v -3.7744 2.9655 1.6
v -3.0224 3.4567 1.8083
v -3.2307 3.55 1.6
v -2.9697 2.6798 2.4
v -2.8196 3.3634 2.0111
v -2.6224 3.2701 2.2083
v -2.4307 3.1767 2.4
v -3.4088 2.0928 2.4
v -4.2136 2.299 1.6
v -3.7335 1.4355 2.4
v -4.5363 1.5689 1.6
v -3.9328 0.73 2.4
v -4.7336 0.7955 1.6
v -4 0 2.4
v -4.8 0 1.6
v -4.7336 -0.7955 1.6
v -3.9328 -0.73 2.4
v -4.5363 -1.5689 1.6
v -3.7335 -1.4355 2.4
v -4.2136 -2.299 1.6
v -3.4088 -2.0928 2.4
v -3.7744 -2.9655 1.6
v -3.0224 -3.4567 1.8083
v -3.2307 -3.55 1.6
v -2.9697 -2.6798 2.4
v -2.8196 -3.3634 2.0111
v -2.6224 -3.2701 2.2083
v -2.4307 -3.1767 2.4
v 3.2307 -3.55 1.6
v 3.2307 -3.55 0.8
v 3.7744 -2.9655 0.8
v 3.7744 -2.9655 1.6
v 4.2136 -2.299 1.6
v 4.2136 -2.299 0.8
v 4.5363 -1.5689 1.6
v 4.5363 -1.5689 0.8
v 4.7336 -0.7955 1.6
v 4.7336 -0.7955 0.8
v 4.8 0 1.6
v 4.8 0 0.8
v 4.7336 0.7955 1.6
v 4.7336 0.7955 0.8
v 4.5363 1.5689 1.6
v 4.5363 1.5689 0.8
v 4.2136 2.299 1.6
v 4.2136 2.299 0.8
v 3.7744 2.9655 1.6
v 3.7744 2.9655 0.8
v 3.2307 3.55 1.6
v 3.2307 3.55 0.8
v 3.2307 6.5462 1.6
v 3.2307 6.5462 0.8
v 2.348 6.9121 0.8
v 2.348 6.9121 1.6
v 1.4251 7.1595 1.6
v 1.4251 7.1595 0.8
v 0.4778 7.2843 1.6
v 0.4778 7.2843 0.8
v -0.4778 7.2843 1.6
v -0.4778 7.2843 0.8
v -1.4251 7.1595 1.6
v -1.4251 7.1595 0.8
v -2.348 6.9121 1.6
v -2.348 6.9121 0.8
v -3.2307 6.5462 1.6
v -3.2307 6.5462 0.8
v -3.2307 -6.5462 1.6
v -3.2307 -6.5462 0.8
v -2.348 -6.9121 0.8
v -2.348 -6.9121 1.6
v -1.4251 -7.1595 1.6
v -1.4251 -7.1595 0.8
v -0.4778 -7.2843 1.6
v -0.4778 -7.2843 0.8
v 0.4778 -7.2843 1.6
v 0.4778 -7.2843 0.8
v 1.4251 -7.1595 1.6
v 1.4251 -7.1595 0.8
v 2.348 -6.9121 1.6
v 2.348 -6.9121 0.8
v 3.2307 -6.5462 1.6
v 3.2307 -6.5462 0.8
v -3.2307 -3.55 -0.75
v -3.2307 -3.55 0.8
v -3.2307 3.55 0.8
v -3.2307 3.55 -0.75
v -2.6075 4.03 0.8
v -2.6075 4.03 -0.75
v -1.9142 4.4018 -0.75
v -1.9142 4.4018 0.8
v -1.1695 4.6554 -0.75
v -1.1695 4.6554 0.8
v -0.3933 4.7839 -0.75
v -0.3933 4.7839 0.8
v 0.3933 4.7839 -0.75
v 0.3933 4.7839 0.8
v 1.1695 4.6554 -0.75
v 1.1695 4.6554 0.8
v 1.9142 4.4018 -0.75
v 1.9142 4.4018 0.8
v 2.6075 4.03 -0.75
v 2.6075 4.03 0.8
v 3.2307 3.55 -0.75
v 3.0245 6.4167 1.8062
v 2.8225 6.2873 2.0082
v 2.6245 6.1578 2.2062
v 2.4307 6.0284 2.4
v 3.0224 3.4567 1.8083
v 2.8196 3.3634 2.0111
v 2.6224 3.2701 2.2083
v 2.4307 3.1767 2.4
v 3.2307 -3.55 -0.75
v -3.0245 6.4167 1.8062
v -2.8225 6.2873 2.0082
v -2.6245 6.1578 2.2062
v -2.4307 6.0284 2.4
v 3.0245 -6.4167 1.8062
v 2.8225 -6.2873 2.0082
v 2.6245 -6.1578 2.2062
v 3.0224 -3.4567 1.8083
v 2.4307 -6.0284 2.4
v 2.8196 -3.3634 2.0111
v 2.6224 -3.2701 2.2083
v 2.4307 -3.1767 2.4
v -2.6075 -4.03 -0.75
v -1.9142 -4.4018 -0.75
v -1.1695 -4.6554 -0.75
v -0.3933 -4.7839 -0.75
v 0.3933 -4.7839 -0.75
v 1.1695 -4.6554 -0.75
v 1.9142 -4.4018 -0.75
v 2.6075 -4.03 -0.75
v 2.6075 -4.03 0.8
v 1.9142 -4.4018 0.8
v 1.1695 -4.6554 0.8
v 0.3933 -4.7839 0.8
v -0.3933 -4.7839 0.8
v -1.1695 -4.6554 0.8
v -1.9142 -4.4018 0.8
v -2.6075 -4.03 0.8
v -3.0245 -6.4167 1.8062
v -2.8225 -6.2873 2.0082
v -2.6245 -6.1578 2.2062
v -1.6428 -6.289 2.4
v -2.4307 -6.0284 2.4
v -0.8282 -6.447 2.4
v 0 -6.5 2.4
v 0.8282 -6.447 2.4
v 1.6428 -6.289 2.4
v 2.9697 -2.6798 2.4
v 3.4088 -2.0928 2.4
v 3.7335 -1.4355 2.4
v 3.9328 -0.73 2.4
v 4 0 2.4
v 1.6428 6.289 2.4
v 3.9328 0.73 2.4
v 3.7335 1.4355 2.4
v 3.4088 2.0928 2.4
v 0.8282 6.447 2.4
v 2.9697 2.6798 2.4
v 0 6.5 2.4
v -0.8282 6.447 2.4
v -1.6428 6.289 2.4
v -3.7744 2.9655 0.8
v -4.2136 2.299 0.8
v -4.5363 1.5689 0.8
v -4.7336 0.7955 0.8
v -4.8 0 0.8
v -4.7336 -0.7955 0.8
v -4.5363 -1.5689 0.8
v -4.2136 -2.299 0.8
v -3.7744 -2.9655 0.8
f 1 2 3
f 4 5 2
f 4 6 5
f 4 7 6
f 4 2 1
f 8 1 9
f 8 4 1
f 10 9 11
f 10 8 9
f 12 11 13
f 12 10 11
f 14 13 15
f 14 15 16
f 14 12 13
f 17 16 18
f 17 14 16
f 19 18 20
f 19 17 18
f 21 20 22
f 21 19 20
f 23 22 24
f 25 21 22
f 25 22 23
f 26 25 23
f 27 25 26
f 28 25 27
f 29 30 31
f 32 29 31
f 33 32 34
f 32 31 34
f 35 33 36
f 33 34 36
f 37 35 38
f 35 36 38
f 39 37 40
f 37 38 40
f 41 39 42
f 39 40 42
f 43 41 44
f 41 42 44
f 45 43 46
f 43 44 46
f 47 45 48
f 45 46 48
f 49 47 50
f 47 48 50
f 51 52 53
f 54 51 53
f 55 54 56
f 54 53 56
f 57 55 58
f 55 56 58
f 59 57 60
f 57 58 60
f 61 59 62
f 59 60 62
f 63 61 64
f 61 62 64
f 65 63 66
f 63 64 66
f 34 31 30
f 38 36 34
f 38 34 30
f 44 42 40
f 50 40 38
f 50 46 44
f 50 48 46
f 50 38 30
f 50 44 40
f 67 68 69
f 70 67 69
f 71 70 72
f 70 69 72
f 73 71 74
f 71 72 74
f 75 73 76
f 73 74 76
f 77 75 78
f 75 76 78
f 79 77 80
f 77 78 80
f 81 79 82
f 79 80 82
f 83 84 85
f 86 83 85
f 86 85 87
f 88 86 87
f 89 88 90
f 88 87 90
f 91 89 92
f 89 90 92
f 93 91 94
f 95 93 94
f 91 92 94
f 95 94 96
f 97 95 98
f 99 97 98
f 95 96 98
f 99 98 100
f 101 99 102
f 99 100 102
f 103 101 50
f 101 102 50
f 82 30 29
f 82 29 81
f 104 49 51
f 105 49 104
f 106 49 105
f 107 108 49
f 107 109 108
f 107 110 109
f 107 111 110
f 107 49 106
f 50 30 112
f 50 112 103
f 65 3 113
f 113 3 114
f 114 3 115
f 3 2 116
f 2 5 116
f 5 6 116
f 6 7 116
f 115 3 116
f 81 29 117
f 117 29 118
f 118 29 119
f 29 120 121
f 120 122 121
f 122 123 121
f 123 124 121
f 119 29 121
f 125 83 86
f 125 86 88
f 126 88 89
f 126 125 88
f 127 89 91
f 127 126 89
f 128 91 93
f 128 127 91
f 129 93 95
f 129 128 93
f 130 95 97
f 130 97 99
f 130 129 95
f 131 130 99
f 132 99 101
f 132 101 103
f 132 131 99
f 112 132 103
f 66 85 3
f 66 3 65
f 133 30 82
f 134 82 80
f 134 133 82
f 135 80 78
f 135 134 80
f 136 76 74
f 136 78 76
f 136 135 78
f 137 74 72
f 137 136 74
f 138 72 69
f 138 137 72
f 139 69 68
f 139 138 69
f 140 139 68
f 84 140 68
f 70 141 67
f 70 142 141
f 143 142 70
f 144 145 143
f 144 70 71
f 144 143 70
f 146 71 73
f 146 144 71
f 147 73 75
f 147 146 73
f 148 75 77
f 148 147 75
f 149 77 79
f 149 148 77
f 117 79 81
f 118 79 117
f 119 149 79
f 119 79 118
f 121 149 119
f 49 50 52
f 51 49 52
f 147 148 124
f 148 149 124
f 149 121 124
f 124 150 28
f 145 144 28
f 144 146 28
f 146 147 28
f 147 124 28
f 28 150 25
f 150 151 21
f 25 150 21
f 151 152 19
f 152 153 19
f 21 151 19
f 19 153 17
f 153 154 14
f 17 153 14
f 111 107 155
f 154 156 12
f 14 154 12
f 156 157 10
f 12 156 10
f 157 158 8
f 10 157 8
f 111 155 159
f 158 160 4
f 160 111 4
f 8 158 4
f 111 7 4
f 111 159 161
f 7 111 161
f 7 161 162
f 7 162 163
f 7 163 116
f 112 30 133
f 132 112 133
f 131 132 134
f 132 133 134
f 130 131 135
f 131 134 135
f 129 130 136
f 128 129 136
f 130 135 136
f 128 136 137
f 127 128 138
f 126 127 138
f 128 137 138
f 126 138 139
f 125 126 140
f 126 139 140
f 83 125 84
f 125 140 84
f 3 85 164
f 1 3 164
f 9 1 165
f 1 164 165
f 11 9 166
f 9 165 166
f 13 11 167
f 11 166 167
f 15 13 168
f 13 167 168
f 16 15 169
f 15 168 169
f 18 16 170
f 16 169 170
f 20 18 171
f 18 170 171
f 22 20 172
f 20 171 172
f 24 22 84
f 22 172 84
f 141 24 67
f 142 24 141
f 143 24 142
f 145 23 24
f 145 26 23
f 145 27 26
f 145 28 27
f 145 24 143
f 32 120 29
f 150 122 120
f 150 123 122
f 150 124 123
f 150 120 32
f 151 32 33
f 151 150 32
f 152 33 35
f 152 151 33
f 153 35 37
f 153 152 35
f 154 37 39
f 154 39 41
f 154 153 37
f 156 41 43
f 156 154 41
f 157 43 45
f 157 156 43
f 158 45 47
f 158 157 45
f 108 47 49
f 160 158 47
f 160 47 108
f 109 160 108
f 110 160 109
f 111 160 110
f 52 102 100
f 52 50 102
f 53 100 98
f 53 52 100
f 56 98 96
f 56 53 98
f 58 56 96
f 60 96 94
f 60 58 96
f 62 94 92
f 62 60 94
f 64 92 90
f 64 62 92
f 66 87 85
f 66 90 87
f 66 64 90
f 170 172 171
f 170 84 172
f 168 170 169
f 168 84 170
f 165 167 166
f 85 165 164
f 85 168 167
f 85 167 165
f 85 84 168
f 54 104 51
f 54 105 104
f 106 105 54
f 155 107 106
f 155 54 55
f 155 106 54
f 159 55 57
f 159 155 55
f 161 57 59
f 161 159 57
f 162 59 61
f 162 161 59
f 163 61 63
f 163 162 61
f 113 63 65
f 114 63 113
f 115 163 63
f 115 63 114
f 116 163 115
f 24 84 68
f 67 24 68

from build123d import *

# Parameters (mm, degrees)
PAD007_DEPTH = 1.6
CHAMFER_SIZE = 0.8
PAD008_DEPTH = 1.55


with BuildPart() as part:
    # Sketch011 → Pad007 (new body)
    with BuildSketch(Plane.XY):
        with BuildLine():
            Line((-3.230712, 3.55), (-3.230712, 6.546182))
            ThreePointArc((3.230712, 6.546182), (0, 7.3), (-3.230712, 6.546182))
            Line((3.230712, 3.55), (3.230712, 6.546182))
            ThreePointArc((3.230712, -3.55), (4.8, 0), (3.230712, 3.55))
            Line((3.230712, -3.55), (3.230712, -6.546182))
            ThreePointArc((-3.230712, -6.546182), (0, -7.3), (3.230712, -6.546182))
            Line((-3.230712, -3.55), (-3.230712, -6.546182))
            ThreePointArc((-3.230712, 3.55), (-4.8, 0), (-3.230712, -3.55))
        make_face()
    extrude(amount=PAD007_DEPTH)

    # Chamfer
    chamfer_edges = [part.edges().sort_by_distance(p)[0] for p in [
        (-4.8, 0, 1.6),
        (-3.230712, -5.048091, 1.6),
        (0, -7.3, 1.6),
        (3.230712, -5.048091, 1.6),
        (4.8, 0, 1.6),
        (3.230712, 5.048091, 1.6),
        (0, 7.3, 1.6),
        (-3.230712, 5.048091, 1.6),
    ]]
    chamfer(chamfer_edges, length=CHAMFER_SIZE)

    # Sketch013 (on Face4 of Chamfer) → Pad008 (join)
    with BuildSketch(Plane(origin=(0, 0, 0), x_dir=(1, 0, 0), z_dir=(0, 0, -1))):
        with BuildLine():
            Line((-3.230712, 3.55), (-3.230712, -3.55))
            ThreePointArc((-3.230712, -3.55), (0, -4.8), (3.230712, -3.55))
            Line((3.230712, 3.55), (3.230712, -3.55))
            ThreePointArc((3.230712, 3.55), (0, 4.8), (-3.230712, 3.55))
        make_face()
    extrude(amount=PAD008_DEPTH)


with BuildPart() as part_1:
    # Body002 placement: moved
    add(part.part.moved(Location((0, 0, 0.8))))


solid = part_1.part
